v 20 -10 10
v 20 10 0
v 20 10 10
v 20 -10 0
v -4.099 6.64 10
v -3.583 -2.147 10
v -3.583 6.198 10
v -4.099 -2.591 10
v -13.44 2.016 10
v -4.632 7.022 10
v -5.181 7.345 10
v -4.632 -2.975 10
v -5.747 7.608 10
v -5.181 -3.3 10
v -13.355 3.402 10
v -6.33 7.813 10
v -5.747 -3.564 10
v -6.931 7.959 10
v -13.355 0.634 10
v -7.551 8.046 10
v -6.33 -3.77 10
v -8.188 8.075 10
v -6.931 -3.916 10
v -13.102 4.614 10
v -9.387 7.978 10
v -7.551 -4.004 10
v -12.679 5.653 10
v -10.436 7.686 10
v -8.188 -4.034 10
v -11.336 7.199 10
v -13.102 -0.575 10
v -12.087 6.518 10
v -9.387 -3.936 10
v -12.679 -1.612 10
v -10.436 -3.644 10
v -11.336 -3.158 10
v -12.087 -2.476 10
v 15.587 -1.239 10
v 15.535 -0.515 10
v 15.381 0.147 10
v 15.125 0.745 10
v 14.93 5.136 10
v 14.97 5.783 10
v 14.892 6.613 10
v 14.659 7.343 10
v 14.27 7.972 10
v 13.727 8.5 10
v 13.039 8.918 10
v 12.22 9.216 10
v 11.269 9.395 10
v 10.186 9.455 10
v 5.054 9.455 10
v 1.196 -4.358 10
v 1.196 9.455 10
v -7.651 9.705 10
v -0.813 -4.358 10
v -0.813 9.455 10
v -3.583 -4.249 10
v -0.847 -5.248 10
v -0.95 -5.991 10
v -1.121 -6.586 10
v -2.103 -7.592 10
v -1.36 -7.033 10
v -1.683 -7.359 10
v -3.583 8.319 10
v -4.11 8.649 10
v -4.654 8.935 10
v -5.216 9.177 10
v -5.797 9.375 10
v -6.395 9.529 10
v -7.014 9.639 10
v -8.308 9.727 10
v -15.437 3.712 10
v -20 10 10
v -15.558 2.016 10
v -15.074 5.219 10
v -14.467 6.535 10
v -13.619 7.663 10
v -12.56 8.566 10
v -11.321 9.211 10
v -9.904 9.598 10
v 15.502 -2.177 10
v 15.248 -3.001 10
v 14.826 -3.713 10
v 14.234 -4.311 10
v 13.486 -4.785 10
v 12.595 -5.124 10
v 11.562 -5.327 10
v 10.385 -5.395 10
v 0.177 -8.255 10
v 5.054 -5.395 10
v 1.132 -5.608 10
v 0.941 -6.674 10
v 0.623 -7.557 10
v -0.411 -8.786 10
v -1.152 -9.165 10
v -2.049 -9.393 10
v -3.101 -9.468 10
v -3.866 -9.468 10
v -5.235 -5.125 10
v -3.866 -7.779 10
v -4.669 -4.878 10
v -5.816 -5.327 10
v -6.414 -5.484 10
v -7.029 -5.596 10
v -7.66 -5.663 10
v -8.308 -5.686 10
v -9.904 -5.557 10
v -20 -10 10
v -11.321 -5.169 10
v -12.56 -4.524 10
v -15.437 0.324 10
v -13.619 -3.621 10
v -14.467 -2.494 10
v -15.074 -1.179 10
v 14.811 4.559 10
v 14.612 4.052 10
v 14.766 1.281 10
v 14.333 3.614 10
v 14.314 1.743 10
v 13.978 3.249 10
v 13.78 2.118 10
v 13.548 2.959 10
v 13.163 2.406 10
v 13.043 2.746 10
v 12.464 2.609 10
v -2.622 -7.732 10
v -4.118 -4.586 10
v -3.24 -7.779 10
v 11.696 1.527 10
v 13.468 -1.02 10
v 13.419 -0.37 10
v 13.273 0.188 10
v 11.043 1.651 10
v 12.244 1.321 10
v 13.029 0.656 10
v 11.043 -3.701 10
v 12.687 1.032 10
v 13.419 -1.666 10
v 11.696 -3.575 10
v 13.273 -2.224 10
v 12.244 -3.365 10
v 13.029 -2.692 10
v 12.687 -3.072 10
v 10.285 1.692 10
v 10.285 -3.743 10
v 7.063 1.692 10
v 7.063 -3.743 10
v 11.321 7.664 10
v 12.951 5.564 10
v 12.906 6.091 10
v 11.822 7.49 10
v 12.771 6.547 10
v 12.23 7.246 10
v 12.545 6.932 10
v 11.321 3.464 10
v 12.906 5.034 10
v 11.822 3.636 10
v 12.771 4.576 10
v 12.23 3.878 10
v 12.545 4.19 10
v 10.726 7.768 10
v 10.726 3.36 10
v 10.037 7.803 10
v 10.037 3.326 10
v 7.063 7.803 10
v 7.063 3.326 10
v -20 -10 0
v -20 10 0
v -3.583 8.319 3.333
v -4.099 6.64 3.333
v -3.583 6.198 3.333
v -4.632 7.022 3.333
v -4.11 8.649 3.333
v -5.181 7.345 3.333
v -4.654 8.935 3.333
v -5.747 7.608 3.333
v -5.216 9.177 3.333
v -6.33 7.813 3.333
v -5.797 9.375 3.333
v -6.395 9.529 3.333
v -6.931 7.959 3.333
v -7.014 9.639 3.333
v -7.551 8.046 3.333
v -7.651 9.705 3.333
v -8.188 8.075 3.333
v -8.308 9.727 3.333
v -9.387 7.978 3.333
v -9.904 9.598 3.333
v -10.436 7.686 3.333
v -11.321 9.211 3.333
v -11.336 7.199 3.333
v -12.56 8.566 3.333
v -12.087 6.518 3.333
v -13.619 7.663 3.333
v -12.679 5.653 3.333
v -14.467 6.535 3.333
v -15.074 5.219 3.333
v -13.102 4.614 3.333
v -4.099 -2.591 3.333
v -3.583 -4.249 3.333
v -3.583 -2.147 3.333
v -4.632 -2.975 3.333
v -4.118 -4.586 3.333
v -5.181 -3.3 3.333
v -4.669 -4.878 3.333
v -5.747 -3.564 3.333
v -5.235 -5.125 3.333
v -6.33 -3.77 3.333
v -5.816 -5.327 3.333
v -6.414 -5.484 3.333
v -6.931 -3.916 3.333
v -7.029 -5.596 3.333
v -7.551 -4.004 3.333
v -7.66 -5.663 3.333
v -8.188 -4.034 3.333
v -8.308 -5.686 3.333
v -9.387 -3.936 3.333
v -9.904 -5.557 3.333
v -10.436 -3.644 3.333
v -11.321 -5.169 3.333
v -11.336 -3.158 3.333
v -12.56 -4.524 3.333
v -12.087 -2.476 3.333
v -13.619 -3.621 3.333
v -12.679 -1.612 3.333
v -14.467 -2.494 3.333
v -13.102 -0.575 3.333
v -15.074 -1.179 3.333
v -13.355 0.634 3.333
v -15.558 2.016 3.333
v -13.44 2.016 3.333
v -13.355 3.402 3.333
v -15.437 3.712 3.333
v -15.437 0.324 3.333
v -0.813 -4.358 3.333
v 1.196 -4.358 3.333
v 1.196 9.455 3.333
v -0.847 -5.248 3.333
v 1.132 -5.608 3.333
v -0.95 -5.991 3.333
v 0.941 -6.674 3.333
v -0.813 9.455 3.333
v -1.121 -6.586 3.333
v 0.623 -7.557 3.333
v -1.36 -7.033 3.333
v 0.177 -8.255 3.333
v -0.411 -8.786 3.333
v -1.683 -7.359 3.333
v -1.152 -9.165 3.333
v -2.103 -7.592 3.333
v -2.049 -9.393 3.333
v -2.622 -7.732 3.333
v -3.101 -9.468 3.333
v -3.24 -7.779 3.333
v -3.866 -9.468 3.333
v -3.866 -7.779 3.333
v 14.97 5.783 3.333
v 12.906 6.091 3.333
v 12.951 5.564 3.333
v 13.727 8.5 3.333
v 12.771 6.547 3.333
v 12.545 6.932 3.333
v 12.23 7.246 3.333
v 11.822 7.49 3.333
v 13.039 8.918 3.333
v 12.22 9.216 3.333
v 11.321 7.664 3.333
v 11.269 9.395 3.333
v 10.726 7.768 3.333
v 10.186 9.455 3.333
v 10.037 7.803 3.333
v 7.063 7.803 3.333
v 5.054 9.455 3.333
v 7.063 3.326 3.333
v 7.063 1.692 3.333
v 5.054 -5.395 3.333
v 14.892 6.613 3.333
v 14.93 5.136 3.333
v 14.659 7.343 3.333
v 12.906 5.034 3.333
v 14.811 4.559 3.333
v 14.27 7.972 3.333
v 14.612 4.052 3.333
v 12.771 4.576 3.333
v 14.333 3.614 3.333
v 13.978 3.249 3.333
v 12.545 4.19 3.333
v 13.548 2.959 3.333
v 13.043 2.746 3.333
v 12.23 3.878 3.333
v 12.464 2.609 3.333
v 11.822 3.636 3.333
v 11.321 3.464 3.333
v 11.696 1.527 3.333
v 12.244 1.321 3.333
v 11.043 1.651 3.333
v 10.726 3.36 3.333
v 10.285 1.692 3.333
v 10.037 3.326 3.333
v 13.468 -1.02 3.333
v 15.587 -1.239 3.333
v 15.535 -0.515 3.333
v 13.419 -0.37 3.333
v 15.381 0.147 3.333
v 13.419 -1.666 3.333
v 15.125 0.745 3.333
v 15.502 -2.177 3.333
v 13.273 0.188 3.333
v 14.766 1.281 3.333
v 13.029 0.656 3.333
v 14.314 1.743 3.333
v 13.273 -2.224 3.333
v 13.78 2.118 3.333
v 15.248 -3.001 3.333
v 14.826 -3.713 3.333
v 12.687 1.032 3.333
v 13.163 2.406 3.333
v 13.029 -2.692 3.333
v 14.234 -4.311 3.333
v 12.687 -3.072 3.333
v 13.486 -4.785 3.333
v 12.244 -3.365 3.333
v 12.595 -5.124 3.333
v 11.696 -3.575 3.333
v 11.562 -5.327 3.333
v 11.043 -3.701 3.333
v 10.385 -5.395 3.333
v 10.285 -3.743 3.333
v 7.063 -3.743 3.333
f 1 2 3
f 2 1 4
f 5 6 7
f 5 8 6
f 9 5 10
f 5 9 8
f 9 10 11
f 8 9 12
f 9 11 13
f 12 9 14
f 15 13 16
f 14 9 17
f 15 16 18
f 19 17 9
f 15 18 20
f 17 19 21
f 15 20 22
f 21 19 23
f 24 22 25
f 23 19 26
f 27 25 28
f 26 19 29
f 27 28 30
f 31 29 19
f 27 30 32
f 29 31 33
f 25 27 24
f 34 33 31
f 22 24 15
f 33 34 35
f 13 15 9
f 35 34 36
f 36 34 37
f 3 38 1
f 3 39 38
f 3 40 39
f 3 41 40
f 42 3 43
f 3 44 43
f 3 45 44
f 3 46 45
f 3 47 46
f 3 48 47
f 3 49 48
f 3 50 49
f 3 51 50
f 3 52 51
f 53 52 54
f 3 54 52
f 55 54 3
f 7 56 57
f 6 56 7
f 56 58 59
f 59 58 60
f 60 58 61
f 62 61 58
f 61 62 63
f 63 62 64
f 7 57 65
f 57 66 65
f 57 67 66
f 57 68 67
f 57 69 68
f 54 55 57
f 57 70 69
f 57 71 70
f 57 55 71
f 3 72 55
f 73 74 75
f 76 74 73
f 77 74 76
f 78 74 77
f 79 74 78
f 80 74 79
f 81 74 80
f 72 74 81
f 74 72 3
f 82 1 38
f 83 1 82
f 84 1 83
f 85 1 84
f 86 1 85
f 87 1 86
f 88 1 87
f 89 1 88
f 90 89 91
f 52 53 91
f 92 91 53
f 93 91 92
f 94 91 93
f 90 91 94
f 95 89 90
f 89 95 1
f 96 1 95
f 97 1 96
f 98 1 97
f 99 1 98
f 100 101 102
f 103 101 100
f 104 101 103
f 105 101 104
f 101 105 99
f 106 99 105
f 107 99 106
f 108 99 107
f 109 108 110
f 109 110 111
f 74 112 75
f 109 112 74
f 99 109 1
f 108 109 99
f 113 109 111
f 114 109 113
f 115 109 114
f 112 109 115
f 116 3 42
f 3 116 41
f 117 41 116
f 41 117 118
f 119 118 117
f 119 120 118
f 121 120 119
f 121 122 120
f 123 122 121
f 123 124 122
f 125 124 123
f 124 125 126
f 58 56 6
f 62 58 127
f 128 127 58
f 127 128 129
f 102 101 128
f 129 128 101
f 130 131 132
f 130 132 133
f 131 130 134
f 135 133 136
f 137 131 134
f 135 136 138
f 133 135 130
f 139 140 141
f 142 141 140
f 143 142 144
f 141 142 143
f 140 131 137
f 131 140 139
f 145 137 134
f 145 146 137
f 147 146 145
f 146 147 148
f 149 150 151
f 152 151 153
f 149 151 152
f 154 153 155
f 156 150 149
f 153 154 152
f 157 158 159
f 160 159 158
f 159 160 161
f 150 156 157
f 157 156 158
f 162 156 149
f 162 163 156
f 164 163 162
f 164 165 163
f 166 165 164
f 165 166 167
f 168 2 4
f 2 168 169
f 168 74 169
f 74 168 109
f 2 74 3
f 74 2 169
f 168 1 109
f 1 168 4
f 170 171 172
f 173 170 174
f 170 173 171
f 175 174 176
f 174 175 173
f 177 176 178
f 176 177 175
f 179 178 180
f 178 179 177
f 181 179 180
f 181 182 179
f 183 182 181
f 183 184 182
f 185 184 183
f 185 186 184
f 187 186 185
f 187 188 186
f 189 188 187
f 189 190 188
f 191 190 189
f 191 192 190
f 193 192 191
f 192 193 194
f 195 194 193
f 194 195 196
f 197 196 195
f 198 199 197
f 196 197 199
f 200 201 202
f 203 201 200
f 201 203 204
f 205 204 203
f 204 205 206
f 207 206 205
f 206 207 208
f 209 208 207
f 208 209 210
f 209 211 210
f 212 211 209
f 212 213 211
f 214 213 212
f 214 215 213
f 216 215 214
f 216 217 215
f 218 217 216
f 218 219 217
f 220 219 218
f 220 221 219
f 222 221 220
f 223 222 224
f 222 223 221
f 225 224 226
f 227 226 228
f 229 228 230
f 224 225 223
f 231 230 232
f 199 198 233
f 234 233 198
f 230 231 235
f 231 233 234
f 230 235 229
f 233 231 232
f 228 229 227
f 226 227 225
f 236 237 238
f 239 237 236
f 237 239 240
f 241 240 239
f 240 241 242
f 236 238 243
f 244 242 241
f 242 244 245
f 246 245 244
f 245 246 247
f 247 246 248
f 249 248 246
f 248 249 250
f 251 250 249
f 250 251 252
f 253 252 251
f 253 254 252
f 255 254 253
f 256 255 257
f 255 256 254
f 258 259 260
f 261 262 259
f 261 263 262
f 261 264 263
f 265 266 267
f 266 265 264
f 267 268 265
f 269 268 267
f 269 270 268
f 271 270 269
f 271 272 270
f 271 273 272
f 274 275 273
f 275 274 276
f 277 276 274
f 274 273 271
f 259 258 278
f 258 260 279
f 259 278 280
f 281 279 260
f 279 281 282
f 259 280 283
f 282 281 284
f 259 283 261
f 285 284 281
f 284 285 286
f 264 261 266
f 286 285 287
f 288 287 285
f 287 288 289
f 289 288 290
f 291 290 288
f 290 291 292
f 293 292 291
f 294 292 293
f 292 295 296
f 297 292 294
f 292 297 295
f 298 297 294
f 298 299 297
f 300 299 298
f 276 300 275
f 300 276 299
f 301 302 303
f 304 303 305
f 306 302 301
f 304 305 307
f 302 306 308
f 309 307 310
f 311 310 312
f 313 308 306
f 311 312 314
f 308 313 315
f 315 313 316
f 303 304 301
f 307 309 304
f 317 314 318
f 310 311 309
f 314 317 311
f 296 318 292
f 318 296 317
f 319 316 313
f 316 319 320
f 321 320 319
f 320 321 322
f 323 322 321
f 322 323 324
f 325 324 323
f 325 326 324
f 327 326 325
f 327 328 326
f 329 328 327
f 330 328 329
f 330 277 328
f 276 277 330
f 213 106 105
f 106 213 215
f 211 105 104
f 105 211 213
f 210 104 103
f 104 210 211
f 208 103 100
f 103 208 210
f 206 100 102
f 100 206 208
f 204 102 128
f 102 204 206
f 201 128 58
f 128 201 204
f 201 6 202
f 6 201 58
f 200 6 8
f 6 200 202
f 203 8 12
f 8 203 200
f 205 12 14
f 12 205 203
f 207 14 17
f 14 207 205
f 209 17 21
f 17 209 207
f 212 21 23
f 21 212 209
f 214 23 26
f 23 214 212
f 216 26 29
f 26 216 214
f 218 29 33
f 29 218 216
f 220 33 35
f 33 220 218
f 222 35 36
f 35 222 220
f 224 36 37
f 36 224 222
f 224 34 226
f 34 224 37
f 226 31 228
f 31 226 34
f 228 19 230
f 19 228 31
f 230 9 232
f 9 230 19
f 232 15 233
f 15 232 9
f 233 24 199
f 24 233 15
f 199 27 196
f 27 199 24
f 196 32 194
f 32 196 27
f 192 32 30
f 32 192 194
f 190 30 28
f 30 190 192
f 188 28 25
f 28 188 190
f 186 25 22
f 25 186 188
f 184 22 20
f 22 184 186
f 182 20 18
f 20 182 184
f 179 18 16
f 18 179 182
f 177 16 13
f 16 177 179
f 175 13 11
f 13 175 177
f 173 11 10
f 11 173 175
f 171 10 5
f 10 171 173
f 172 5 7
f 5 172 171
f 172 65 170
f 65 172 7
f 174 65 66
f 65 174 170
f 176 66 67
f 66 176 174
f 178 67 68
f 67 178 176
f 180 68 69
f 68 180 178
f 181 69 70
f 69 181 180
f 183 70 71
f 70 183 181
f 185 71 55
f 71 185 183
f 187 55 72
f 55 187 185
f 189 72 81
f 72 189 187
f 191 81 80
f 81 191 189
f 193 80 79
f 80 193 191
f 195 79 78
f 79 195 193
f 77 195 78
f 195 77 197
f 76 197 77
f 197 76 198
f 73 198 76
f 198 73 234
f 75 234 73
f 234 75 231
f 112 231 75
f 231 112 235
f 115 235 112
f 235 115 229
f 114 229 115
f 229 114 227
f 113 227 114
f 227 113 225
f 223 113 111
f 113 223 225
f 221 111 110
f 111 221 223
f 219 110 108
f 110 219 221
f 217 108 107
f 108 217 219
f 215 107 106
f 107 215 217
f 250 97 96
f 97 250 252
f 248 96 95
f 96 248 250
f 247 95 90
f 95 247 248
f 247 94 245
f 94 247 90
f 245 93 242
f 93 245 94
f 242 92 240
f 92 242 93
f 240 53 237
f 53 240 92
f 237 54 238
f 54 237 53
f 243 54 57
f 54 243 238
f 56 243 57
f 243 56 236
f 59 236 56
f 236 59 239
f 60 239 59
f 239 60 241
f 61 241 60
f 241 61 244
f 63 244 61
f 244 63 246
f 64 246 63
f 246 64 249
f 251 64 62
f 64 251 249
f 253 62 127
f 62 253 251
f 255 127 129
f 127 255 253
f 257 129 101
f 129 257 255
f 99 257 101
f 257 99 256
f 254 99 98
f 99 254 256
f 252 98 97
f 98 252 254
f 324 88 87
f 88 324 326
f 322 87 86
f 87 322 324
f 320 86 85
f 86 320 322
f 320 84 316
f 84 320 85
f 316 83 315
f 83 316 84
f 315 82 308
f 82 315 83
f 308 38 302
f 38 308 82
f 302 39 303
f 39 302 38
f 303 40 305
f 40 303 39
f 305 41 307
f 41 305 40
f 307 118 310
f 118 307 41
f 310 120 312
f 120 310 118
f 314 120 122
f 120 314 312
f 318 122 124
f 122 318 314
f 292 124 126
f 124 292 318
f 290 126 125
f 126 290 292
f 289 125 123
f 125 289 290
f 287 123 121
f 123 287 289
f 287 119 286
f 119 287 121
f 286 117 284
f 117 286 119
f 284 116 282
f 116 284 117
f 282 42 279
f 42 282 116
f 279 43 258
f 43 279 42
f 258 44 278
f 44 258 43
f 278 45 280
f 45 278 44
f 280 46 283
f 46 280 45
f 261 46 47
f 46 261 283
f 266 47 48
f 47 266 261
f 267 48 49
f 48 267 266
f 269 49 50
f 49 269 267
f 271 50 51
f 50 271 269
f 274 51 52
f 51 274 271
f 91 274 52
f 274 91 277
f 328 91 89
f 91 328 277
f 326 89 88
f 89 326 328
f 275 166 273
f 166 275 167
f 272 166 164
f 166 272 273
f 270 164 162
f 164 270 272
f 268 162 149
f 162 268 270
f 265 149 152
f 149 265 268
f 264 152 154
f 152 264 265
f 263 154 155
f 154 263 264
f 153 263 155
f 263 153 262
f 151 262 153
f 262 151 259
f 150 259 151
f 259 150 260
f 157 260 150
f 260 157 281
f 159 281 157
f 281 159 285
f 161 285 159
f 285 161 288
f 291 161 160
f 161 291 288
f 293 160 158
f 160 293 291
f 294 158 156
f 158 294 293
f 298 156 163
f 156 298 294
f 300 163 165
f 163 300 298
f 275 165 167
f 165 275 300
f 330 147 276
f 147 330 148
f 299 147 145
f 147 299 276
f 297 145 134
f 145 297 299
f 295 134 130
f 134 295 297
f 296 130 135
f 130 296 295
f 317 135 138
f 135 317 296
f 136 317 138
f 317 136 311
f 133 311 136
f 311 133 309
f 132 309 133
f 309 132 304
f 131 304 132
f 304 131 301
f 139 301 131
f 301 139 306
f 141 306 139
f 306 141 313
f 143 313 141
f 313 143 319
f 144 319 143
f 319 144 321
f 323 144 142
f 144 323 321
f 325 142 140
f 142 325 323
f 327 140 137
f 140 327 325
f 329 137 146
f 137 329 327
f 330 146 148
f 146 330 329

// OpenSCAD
// LetterBlock.scad - Basic usage of text() and linear_extrude()

// Module instantiation
LetterBlock("CJB",20,40);

// Module definition.
// size=30 defines an optional parameter with a default value.
module LetterBlock(letter, height=30,width=0,depth=0) {
    width = width==0 ? height : width;
    depth = depth==0 ? height/2 : depth;
    size=height;
    difference() {
        translate([0,0,size/4]) cube([width,height,depth], center=true);
        translate([0,0,size/6]) {
            // convexity is needed for correct preview
            // since characters can be highly concave
            linear_extrude(height=size, convexity=4)
                text(letter, 
                     size=size*22/30,
                     font="Bitstream Vera Sans",
                     halign="center",
                     valign="center");
        }
    }
}

echo(version=version());
// Written by Marius Kintel <marius@kintel.net>
//
// To the extent possible under law, the author(s) have dedicated all
// copyright and related and neighboring rights to this software to the
// public domain worldwide. This software is distributed without any
// warranty.
//
// You should have received a copy of the CC0 Public Domain
// Dedication along with this software.
// If not, see <http://creativecommons.org/publicdomain/zero/1.0/>.
